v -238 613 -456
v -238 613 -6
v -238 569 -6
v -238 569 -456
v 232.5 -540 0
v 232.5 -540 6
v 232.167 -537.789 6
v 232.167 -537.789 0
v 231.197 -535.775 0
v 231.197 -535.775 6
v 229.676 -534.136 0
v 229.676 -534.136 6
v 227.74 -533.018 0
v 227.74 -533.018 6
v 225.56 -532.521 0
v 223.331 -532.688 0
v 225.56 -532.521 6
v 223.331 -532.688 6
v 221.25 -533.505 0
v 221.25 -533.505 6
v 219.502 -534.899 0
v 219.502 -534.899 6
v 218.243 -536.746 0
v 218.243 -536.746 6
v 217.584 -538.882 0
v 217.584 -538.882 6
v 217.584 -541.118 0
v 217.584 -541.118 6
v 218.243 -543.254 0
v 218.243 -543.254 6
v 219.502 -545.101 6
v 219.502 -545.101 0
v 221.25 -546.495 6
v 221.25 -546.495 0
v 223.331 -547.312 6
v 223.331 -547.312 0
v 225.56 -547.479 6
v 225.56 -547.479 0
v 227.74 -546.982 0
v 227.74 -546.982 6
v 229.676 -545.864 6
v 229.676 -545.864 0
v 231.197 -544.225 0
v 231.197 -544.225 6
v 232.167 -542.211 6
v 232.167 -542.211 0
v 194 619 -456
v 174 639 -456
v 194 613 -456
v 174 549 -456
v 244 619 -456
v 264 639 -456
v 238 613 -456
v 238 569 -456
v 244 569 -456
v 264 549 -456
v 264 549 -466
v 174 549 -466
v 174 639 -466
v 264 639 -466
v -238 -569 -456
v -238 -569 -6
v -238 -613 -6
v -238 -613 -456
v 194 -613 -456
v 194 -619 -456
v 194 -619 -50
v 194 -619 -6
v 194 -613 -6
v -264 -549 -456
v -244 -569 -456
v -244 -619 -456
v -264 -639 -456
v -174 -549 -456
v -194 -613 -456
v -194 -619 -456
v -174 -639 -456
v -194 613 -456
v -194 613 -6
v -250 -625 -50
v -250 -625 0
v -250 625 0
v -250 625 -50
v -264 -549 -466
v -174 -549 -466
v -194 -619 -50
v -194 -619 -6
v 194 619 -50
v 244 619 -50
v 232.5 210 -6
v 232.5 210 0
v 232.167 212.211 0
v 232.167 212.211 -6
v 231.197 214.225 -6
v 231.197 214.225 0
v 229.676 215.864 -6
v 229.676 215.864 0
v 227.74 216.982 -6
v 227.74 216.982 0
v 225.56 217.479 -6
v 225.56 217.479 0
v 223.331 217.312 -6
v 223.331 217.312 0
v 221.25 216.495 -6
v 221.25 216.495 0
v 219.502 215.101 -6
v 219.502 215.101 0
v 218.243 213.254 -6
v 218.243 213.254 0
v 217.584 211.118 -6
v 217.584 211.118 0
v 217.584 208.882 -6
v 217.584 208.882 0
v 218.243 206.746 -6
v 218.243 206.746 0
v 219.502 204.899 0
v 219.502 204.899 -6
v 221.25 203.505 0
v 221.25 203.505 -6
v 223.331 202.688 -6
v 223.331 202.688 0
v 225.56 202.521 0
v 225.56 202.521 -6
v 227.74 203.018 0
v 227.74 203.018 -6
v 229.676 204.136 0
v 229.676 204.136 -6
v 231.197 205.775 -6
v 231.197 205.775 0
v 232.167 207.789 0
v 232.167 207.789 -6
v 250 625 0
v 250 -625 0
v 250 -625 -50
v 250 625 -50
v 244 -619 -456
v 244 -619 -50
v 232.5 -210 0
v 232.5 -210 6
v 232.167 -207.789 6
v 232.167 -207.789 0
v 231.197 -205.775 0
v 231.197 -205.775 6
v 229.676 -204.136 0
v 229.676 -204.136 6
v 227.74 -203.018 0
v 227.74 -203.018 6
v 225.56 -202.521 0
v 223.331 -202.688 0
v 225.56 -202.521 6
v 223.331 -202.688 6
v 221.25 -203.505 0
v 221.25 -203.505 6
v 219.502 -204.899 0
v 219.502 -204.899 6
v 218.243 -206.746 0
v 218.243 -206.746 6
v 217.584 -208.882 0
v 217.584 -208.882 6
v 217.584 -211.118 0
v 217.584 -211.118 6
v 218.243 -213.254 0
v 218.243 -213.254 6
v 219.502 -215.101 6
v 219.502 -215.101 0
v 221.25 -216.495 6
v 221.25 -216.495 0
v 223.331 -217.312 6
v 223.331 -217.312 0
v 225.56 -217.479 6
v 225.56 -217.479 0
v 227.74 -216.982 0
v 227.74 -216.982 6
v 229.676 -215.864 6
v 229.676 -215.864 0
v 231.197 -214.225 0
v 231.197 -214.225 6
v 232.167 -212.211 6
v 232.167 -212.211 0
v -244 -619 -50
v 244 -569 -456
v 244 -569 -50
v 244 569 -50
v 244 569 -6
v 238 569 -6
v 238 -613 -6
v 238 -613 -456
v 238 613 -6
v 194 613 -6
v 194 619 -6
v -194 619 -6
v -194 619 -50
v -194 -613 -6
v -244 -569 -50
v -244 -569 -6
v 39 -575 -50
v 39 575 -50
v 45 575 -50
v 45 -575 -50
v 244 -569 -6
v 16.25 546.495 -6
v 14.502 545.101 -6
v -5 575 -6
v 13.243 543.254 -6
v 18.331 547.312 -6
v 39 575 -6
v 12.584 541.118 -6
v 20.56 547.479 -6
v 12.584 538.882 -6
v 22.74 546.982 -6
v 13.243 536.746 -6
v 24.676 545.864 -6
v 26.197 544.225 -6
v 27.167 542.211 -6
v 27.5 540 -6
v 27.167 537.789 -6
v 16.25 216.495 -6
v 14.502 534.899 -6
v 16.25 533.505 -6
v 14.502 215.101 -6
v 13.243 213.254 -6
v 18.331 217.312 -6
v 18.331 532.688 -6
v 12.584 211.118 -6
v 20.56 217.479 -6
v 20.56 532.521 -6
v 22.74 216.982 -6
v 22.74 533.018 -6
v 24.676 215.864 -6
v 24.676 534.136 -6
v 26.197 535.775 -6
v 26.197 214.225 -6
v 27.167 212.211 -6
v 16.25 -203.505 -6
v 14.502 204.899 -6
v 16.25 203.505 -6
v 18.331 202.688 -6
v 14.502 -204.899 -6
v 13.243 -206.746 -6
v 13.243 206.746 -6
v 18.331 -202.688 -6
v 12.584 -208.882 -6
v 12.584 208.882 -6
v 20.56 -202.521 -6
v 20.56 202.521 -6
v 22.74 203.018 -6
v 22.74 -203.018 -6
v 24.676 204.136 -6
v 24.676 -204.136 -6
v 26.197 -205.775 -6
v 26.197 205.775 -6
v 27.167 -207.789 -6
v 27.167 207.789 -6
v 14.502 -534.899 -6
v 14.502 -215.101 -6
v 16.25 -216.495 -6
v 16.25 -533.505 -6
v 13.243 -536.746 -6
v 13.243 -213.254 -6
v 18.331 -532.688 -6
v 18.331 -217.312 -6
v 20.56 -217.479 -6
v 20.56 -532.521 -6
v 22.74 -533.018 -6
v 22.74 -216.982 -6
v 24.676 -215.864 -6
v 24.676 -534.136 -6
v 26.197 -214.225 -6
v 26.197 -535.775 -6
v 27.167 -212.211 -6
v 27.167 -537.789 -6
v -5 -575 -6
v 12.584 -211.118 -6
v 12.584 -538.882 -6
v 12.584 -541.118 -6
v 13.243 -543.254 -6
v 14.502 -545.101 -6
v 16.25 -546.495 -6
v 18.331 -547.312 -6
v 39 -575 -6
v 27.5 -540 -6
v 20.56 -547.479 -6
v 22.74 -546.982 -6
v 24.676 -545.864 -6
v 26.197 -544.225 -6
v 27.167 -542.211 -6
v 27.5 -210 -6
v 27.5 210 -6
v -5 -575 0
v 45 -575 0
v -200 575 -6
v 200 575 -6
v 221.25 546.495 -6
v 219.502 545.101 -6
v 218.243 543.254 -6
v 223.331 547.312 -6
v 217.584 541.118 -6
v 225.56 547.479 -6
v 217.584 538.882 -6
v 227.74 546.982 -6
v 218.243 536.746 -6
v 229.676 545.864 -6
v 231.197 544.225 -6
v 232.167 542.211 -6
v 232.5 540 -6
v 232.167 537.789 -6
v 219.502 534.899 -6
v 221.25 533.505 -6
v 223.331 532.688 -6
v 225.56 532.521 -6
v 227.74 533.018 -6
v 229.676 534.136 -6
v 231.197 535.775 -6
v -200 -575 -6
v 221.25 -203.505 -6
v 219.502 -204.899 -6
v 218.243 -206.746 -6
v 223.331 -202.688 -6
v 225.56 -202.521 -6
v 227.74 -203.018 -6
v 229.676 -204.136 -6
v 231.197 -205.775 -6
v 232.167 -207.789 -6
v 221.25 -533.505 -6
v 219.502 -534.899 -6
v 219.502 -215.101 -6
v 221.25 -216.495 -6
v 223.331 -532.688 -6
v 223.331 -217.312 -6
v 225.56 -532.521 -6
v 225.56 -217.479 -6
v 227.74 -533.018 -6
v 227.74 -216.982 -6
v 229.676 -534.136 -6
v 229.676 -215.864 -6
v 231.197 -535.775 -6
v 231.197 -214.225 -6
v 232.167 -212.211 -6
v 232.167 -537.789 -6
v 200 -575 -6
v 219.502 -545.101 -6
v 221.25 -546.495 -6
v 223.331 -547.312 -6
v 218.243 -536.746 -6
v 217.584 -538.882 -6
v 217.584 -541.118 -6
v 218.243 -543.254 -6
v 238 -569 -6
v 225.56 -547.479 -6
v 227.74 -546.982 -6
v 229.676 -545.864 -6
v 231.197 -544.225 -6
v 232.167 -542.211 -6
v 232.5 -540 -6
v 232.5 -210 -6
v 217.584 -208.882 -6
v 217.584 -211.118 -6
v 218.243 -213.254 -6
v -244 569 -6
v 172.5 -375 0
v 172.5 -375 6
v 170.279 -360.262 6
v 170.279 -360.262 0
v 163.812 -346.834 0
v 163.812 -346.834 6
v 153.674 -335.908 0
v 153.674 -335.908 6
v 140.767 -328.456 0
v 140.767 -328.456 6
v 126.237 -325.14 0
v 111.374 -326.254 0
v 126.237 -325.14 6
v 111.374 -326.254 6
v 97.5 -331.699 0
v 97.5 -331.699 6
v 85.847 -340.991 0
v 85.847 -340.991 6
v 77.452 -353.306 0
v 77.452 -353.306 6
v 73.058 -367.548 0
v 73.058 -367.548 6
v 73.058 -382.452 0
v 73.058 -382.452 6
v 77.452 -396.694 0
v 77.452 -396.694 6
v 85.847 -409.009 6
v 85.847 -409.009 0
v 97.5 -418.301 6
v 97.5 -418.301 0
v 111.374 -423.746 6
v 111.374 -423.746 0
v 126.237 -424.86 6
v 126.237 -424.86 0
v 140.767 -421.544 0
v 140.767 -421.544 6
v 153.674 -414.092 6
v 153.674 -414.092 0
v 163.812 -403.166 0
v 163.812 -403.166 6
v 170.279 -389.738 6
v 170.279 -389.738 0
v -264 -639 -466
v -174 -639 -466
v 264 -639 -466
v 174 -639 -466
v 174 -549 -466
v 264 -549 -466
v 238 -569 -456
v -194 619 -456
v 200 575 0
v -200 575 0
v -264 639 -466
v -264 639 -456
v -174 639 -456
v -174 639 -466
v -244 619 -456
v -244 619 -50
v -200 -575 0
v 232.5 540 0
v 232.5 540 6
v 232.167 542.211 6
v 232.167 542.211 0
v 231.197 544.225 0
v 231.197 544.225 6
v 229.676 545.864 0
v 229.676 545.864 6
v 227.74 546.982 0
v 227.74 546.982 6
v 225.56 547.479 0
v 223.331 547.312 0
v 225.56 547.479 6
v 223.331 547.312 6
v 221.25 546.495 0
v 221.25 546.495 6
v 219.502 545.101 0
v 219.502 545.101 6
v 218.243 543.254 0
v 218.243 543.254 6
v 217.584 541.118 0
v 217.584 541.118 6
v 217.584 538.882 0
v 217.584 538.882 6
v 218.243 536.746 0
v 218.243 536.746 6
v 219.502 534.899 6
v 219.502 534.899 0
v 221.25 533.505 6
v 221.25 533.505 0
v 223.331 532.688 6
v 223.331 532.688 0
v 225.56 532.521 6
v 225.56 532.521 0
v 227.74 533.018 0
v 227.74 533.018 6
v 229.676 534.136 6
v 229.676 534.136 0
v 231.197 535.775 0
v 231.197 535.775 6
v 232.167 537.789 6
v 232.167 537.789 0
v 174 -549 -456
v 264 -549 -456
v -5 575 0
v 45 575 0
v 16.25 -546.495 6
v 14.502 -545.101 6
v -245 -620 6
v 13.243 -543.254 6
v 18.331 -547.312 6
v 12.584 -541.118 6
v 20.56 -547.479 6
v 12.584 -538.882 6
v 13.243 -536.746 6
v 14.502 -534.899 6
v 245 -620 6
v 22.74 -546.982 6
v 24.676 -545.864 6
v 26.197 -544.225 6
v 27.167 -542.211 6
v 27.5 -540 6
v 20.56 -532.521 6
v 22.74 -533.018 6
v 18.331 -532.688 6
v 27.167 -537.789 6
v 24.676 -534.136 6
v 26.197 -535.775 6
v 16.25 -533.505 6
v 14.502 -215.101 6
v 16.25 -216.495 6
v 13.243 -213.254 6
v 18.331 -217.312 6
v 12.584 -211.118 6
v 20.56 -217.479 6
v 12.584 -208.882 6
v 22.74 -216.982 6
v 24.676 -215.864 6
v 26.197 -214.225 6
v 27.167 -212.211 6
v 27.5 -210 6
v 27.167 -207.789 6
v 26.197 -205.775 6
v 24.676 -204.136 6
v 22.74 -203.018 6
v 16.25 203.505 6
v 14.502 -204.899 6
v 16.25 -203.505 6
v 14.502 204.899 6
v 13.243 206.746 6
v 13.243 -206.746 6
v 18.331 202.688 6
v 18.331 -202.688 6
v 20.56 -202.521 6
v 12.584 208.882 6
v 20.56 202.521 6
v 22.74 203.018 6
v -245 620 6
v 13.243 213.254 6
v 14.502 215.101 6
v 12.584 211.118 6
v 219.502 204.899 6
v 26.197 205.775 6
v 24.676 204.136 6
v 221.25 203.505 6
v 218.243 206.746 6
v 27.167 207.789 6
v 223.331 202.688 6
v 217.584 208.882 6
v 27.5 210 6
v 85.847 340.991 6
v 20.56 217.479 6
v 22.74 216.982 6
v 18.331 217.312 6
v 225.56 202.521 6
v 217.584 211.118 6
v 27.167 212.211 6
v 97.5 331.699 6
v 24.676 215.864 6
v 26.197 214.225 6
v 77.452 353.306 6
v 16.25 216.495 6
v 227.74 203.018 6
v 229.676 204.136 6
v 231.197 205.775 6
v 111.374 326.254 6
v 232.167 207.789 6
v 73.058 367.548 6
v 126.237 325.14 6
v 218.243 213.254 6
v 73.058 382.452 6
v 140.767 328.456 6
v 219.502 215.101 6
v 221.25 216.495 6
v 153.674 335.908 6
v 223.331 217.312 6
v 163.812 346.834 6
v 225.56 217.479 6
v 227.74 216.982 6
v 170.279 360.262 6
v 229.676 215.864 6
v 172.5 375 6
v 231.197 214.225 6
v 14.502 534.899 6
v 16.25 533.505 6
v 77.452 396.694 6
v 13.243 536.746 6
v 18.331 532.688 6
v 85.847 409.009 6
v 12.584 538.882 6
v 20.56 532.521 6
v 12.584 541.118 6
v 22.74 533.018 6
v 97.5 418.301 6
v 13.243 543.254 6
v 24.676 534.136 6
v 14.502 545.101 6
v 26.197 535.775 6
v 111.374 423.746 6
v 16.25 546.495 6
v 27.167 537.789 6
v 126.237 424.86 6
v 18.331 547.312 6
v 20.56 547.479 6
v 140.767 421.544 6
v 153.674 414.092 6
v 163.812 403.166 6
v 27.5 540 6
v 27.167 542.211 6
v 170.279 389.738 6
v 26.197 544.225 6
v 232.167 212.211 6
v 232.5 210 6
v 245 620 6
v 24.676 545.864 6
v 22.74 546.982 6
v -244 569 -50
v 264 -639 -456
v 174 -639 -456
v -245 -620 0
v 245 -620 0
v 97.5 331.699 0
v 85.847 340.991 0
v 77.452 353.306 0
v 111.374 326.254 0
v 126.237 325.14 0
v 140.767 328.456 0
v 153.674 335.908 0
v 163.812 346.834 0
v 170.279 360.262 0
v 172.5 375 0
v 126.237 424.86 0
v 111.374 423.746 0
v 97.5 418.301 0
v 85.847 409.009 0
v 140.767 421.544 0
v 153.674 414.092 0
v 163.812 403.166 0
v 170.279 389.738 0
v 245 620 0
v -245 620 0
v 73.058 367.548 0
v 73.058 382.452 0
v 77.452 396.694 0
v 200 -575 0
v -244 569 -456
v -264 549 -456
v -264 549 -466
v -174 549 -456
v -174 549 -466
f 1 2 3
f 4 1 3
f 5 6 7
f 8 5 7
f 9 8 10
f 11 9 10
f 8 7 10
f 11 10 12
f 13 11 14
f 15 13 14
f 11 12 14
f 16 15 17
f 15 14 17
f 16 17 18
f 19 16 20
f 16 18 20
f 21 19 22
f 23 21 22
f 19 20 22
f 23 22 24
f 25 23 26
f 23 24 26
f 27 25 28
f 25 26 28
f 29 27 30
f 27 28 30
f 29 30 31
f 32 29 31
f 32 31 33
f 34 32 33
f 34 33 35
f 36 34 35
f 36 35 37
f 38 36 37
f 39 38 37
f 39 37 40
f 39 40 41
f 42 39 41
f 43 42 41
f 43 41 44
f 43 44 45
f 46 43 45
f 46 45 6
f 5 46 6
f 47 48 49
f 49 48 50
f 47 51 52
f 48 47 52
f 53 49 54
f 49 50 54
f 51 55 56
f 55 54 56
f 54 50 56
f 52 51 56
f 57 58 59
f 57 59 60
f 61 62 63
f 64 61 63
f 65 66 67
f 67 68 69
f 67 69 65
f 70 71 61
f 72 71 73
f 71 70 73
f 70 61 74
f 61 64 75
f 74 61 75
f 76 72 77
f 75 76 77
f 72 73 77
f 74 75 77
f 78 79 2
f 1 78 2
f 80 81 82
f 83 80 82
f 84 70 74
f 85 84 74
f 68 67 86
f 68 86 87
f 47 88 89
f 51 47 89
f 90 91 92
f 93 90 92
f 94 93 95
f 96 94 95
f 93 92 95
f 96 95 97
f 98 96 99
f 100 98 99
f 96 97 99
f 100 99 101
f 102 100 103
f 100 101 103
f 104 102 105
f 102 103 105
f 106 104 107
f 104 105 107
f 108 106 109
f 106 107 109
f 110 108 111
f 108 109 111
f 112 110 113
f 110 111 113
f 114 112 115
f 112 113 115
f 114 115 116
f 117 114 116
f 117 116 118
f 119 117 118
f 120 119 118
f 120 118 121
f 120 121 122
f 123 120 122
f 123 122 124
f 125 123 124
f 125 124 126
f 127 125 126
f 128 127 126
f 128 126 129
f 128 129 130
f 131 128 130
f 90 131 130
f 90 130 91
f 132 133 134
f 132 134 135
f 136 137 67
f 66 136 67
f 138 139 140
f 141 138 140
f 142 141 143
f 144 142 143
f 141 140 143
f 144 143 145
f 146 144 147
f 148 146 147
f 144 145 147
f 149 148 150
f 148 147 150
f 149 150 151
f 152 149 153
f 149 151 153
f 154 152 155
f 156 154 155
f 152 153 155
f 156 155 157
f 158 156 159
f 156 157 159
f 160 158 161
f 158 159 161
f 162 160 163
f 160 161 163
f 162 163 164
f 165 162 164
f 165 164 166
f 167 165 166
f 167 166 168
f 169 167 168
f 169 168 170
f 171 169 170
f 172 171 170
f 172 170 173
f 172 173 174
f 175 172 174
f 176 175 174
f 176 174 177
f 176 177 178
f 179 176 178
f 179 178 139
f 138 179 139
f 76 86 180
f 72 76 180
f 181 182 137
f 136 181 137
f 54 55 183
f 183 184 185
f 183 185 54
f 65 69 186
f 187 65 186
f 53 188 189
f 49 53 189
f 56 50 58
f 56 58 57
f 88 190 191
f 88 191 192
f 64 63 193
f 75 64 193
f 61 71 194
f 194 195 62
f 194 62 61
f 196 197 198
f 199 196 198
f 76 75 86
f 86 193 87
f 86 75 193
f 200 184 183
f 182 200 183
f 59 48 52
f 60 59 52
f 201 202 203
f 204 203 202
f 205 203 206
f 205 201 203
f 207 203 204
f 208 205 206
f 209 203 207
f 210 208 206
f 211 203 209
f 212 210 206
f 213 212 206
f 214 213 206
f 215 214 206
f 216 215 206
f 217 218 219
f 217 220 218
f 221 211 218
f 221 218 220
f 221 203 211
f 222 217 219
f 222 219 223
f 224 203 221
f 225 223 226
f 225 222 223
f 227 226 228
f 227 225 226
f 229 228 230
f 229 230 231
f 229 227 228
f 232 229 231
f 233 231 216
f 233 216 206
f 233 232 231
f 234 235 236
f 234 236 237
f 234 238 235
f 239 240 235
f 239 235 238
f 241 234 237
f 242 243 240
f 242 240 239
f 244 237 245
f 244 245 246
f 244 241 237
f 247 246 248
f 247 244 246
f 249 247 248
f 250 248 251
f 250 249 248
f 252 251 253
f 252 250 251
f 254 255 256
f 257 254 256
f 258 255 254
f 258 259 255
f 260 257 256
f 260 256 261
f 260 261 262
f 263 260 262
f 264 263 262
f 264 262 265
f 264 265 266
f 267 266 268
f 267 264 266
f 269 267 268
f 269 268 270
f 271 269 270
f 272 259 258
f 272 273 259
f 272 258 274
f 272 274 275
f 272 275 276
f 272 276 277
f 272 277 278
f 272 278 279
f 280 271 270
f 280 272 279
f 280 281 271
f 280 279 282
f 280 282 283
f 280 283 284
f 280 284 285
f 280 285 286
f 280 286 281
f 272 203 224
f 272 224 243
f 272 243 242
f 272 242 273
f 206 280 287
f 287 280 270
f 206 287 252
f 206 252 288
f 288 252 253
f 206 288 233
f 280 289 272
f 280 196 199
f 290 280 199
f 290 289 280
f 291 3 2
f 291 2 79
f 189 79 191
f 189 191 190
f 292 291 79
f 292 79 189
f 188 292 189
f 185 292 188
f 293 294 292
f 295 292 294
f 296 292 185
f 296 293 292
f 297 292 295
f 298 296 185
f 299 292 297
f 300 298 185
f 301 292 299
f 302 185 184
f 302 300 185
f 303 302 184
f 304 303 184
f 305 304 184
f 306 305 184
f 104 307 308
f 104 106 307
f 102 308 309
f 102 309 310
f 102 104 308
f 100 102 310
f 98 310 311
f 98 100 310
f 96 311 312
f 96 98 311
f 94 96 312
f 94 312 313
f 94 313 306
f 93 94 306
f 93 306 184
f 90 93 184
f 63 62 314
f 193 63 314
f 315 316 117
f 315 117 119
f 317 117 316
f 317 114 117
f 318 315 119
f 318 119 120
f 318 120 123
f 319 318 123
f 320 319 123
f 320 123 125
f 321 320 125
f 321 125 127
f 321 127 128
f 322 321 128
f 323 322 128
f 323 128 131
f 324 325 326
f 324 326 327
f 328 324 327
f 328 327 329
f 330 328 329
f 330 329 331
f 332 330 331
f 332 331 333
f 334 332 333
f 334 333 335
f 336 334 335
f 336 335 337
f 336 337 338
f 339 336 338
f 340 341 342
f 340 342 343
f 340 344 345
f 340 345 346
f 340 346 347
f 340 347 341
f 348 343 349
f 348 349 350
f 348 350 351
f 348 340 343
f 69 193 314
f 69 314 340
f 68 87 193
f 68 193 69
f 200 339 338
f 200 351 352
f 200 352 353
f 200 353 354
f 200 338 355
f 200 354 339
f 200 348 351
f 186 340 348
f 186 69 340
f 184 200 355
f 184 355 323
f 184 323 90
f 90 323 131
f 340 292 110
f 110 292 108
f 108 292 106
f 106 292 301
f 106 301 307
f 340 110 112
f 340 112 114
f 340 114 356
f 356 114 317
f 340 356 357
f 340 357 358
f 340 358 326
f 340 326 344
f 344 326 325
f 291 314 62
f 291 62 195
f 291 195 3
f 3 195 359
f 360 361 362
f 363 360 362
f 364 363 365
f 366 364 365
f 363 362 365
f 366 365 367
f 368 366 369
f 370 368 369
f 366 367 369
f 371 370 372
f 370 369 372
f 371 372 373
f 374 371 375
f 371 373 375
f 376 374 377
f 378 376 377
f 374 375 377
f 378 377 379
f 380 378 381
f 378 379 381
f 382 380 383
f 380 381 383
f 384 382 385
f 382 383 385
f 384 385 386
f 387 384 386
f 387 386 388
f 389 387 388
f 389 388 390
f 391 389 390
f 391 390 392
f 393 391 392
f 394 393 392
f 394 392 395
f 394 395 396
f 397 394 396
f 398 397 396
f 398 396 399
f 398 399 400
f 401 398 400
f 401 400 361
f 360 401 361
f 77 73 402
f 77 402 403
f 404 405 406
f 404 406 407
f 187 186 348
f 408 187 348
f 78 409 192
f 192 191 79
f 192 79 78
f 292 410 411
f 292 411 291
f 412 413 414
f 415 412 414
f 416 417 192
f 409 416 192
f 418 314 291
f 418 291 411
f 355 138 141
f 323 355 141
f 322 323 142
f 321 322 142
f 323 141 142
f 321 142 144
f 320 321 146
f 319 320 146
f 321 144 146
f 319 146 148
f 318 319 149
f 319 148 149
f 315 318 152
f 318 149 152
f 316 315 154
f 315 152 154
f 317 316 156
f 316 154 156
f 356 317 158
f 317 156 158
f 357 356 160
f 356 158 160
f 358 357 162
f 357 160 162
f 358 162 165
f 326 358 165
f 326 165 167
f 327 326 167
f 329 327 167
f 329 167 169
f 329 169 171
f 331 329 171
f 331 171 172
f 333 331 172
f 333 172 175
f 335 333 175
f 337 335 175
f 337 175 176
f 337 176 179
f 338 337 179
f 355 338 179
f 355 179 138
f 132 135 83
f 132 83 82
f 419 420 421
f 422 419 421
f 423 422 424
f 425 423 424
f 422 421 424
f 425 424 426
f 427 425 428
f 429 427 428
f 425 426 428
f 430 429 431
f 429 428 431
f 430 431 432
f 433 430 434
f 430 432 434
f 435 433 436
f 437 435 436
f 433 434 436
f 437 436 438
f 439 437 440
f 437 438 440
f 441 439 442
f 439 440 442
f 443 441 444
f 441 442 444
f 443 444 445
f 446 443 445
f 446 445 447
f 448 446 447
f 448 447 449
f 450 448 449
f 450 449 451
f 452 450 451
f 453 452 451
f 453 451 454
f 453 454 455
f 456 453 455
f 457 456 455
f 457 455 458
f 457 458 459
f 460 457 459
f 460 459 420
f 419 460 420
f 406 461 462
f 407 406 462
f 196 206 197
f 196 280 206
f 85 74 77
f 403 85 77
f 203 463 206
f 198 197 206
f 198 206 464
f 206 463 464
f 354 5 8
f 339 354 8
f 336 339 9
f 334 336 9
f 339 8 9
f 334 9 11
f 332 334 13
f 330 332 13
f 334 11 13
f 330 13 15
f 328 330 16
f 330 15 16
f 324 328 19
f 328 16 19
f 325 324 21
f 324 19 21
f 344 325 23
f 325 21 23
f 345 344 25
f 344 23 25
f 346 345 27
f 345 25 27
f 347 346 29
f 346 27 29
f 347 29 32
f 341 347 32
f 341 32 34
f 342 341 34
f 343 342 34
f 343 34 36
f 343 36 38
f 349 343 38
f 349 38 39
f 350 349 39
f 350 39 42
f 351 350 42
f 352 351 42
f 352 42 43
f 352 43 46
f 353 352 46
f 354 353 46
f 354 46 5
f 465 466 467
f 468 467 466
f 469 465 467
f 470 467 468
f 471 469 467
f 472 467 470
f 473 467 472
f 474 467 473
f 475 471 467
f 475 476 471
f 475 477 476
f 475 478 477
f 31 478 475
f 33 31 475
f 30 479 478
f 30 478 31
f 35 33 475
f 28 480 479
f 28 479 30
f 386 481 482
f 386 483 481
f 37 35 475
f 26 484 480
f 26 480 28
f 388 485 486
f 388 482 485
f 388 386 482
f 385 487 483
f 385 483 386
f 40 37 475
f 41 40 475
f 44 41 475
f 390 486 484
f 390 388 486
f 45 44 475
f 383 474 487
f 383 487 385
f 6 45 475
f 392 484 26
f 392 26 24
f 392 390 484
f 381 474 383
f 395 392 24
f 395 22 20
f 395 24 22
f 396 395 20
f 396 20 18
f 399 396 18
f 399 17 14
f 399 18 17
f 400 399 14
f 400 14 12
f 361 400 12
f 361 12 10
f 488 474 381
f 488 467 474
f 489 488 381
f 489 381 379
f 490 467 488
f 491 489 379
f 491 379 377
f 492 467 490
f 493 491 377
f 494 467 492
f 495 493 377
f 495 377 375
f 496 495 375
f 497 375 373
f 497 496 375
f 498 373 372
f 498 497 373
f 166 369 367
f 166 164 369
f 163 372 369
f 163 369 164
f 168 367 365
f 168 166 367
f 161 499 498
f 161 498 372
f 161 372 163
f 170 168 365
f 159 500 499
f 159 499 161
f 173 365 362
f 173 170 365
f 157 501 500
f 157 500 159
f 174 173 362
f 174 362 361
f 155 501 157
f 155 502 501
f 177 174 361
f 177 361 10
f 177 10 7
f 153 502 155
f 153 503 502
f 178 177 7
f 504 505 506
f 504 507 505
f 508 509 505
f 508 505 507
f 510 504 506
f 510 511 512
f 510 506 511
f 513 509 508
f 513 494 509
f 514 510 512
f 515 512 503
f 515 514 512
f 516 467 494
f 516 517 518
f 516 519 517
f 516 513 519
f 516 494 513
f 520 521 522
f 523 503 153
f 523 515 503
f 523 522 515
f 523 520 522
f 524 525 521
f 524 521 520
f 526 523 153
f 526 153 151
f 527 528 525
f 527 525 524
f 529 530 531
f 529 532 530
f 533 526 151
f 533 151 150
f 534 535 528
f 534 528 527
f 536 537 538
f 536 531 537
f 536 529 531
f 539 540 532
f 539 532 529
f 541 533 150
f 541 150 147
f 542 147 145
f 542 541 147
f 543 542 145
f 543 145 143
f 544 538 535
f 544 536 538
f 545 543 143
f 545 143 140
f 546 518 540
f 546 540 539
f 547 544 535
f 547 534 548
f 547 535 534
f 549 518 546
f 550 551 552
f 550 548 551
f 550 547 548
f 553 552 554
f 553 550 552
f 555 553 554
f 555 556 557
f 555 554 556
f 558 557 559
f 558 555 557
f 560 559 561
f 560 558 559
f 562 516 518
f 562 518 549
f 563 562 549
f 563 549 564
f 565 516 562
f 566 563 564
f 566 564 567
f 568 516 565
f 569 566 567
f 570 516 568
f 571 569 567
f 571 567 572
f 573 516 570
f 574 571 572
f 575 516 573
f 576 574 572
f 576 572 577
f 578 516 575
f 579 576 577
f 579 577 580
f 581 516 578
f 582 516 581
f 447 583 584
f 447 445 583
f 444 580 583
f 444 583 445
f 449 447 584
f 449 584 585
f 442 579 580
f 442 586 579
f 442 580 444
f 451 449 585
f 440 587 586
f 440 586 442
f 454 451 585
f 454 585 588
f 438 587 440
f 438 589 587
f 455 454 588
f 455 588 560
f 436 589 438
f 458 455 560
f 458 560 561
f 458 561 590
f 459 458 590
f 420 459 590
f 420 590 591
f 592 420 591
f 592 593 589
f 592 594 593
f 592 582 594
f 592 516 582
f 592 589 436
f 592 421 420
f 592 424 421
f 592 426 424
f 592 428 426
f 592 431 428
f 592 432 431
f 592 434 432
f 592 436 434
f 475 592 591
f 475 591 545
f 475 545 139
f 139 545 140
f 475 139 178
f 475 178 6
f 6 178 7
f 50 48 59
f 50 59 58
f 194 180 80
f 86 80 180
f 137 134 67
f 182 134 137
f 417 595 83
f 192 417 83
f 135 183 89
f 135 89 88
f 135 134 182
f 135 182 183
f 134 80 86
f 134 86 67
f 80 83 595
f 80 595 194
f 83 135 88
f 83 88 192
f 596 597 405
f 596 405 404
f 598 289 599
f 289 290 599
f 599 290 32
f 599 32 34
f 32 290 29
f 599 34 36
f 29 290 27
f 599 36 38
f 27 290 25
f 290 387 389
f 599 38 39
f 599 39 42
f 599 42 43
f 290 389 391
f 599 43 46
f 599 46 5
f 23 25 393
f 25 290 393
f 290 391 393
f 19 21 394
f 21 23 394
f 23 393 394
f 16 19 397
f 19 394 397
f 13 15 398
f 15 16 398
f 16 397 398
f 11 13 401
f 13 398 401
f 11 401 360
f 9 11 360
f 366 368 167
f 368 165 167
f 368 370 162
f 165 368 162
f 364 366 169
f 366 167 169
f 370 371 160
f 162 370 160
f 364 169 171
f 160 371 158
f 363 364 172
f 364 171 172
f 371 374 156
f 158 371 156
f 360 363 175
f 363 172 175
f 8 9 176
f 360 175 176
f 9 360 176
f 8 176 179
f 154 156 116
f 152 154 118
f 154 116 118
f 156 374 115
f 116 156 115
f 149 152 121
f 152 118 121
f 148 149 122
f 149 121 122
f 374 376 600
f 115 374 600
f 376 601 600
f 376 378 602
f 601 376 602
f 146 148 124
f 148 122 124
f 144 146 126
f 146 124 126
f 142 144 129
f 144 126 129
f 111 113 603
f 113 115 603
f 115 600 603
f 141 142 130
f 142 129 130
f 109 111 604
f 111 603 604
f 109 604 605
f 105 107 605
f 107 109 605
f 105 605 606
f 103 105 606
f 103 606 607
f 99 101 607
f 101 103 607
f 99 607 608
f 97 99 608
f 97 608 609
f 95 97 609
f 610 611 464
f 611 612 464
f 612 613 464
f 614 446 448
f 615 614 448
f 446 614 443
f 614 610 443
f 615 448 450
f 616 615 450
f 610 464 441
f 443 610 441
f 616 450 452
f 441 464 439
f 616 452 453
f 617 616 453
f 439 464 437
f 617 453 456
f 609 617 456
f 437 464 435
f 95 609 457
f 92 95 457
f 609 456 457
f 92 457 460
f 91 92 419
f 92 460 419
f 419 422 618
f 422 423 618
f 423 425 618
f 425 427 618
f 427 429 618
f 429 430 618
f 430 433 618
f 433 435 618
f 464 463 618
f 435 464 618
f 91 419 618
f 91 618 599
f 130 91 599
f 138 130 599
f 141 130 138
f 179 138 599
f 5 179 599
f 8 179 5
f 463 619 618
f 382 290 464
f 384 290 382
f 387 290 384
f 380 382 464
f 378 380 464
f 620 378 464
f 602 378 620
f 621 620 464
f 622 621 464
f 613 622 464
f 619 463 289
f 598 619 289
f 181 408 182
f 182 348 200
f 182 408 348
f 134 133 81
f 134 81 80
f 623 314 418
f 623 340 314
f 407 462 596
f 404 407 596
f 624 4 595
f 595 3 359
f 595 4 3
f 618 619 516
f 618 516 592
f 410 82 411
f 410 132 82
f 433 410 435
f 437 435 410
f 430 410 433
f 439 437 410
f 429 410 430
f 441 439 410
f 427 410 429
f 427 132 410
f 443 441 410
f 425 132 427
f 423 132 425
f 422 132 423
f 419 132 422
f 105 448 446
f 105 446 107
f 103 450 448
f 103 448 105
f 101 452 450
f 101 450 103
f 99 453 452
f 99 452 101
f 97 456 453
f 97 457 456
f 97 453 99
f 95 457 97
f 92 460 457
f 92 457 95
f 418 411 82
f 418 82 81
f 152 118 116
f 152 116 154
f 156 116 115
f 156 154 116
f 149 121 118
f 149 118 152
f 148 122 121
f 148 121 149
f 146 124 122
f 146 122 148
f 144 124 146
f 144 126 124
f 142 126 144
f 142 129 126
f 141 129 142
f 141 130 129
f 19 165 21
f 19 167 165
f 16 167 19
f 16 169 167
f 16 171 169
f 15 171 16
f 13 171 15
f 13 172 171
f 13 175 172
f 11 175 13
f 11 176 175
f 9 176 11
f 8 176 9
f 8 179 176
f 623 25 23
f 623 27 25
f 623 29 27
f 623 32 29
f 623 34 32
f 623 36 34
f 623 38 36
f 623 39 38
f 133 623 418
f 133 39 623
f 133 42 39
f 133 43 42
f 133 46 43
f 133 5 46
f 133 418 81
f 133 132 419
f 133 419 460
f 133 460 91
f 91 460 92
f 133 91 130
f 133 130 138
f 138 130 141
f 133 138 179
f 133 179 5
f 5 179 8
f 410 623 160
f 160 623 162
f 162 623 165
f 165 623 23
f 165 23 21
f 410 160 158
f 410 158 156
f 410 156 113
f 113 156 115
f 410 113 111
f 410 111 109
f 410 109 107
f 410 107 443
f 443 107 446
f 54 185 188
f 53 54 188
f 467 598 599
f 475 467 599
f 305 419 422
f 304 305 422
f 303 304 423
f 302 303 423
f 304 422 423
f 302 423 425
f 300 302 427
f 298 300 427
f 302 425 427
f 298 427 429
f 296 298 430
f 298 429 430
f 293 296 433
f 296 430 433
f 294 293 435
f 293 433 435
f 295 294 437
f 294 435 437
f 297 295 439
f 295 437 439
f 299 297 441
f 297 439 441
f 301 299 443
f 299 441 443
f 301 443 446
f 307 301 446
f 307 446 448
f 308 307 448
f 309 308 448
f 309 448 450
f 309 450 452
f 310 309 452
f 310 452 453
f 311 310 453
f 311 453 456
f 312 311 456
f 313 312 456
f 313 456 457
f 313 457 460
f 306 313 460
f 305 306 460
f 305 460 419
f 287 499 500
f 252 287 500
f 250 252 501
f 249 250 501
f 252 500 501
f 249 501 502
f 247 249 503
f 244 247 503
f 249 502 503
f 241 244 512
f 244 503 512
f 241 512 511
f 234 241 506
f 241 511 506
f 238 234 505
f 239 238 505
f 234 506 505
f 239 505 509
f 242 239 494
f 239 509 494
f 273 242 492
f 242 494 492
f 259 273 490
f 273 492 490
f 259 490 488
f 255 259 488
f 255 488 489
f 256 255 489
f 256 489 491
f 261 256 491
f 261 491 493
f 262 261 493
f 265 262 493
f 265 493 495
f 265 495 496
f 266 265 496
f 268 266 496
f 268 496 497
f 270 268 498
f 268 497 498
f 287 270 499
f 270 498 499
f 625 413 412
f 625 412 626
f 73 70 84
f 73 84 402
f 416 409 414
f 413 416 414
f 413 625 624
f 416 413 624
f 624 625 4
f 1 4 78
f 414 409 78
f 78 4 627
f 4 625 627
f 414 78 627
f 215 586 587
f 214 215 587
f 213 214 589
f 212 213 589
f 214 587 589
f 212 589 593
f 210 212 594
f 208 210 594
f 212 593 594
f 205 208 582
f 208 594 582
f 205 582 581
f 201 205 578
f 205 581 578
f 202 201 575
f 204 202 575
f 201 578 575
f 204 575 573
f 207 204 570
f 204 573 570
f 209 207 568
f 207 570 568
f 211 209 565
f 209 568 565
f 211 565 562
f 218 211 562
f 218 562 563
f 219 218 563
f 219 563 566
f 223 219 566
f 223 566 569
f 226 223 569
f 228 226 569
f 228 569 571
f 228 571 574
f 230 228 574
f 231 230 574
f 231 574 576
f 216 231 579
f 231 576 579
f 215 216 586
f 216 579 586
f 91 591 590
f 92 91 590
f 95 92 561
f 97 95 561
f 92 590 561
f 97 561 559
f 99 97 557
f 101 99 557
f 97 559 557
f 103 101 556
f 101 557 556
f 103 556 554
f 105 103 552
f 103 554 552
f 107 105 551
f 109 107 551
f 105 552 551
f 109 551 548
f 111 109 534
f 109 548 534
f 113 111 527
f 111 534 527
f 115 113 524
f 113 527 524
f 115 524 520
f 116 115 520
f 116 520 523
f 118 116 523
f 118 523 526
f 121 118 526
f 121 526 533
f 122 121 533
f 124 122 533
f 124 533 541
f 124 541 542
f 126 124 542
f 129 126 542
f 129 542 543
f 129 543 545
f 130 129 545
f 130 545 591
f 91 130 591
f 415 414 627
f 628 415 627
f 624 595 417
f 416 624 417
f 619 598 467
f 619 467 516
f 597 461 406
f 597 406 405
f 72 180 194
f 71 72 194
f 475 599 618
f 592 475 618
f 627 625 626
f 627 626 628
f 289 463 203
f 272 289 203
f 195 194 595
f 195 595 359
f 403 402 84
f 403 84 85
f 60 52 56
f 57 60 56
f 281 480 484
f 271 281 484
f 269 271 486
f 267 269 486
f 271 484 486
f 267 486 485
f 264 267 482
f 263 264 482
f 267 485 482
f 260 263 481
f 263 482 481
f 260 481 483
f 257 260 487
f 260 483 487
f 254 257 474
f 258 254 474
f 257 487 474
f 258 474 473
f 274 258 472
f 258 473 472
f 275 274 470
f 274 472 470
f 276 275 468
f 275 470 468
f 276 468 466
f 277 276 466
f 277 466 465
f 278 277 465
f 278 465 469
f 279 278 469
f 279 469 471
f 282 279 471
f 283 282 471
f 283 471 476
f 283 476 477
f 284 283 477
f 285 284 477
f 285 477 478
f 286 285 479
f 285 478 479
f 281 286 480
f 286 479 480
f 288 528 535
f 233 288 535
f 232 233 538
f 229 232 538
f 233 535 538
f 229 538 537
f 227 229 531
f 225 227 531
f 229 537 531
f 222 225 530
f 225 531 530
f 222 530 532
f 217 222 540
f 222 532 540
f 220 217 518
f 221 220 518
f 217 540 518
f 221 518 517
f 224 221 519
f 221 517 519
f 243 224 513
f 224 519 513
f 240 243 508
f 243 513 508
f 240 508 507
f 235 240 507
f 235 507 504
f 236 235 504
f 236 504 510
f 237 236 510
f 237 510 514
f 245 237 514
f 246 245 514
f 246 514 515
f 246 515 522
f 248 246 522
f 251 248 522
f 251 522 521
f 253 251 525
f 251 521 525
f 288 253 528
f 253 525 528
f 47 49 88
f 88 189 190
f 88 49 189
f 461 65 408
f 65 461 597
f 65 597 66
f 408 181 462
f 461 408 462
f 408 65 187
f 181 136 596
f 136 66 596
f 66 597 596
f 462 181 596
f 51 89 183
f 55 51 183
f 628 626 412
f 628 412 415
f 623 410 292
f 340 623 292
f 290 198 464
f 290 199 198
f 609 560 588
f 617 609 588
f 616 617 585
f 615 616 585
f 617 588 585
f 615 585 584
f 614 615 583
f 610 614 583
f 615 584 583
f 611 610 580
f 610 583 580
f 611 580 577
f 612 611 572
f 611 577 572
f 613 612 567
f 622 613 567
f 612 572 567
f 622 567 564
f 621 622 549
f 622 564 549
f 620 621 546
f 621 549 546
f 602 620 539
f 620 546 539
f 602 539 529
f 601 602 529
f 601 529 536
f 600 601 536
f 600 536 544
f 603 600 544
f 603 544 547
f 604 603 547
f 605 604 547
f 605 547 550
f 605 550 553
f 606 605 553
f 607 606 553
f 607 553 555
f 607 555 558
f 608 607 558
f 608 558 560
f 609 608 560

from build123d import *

# Parameters (mm, degrees)
F1_DEPTH  = 250
F3_DEPTH  = 625
F5_DEPTH  = 450
F6_W      = 90
F6_H      = 90
F7_DEPTH  = 10
F8_W      = 490
F8_H      = 1240
F9_DEPTH  = 6
F11_DEPTH = 575
F12_R     = 7.5
F12_R_2   = 50
F13_DEPTH = 12


with BuildPart() as f1:
    # F0 (on Right) → F1 (new body, symmetric)
    with BuildSketch(Plane.YZ):
        Polygon((-575, 0), (-625, 0), (-625, -50), (-619, -50), (-619, -6), (-575, -6), align=None)
    extrude(amount=F1_DEPTH, both=True)



with BuildPart() as f1b:
    # F0 (on Right) → F1, piece 2 (new body, symmetric)
    with BuildSketch(Plane.YZ):
        Polygon((625, 0), (575, 0), (575, -6), (619, -6), (619, -50), (625, -50), align=None)
    extrude(amount=F1_DEPTH, both=True)


with BuildPart() as f1_1:
    add(f1.part)

    add(f1b.part)  # F3 merges F1b
    # F2 (on Front) → F3 (join, symmetric)
    with BuildSketch(Plane.XZ):
        Polygon((-200, -6), (-200, 0), (-250, 0), (-250, -50), (-244, -50), (-244, -6), align=None)
        Polygon((200, 0), (200, -6), (244, -6), (244, -50), (250, -50), (250, 0), align=None)
    extrude(amount=F3_DEPTH, both=True)

    # F4 (on face) → F5 (join)
    with BuildSketch(Plane(origin=(0, 0, -6), x_dir=(1, 0, 0), z_dir=(0, 0, -1))):
        Polygon((244, 569), (244, 619), (194, 619), (194, 613), (238, 613), (238, 569), align=None)
        Polygon((244, -619), (244, -569), (238, -569), (238, -613), (194, -613), (194, -619), align=None)
        Polygon((-194, -619), (-194, -613), (-238, -613), (-238, -569), (-244, -569), (-244, -619), align=None)
        Polygon((-238, 613), (-194, 613), (-194, 619), (-244, 619), (-244, 569), (-238, 569), align=None)
    extrude(amount=F5_DEPTH)

    # F6 (on face) → F7 (join)
    with BuildSketch(Plane(origin=(0, 0, -456), x_dir=(1, 0, 0), z_dir=(0, 0, -1))):
        with Locations((-219, -594)):
            Rectangle(F6_W, F6_H)
        with Locations((-219, 594)):
            Rectangle(F6_W, F6_H)
        with Locations((219, 594)):
            Rectangle(F6_W, F6_H)
        with Locations((219, -594)):
            Rectangle(F6_W, F6_H)
    extrude(amount=F7_DEPTH)


with BuildPart() as f9:
    # F8 (on face) → F9 (new body)
    with BuildSketch(Plane.XY):
        Rectangle(F8_W, F8_H)
    extrude(amount=F9_DEPTH)

    # F10 (on Front) → F11 (join, symmetric)
    with BuildSketch(Plane.XZ):
        Polygon((45, -50), (45, 0), (-5, 0), (-5, -6), (39, -6), (39, -50), align=None)
    extrude(amount=F11_DEPTH, both=True)


with BuildPart() as f13_tool:
    # F12 (on face) → F13 (new body)
    with BuildSketch(Plane.XY.offset(6)):
        with Locations((20, -210)):
            Circle(F12_R)
        with Locations((225, -210)):
            Circle(F12_R)
        with Locations((225, -540)):
            Circle(F12_R)
        with Locations((20, -540)):
            Circle(F12_R)
        with Locations((20, 540)):
            Circle(F12_R)
        with Locations((225, 540)):
            Circle(F12_R)
        with Locations((225, 210)):
            Circle(F12_R)
        with Locations((20, 210)):
            Circle(F12_R)
        with Locations((122.5, -375)):
            Circle(F12_R_2)
        with Locations((122.5, 375)):
            Circle(F12_R_2)
    extrude(amount=-F13_DEPTH)


with BuildPart() as f1_2:
    add(f1_1.part)

    # F13: cut by f13_tool
    add(f13_tool.part, mode=Mode.SUBTRACT)


with BuildPart() as f9_1:
    add(f9.part)

    # F13: cut by f13_tool
    add(f13_tool.part, mode=Mode.SUBTRACT)


solid = Compound([f1_2.part, f9_1.part])
